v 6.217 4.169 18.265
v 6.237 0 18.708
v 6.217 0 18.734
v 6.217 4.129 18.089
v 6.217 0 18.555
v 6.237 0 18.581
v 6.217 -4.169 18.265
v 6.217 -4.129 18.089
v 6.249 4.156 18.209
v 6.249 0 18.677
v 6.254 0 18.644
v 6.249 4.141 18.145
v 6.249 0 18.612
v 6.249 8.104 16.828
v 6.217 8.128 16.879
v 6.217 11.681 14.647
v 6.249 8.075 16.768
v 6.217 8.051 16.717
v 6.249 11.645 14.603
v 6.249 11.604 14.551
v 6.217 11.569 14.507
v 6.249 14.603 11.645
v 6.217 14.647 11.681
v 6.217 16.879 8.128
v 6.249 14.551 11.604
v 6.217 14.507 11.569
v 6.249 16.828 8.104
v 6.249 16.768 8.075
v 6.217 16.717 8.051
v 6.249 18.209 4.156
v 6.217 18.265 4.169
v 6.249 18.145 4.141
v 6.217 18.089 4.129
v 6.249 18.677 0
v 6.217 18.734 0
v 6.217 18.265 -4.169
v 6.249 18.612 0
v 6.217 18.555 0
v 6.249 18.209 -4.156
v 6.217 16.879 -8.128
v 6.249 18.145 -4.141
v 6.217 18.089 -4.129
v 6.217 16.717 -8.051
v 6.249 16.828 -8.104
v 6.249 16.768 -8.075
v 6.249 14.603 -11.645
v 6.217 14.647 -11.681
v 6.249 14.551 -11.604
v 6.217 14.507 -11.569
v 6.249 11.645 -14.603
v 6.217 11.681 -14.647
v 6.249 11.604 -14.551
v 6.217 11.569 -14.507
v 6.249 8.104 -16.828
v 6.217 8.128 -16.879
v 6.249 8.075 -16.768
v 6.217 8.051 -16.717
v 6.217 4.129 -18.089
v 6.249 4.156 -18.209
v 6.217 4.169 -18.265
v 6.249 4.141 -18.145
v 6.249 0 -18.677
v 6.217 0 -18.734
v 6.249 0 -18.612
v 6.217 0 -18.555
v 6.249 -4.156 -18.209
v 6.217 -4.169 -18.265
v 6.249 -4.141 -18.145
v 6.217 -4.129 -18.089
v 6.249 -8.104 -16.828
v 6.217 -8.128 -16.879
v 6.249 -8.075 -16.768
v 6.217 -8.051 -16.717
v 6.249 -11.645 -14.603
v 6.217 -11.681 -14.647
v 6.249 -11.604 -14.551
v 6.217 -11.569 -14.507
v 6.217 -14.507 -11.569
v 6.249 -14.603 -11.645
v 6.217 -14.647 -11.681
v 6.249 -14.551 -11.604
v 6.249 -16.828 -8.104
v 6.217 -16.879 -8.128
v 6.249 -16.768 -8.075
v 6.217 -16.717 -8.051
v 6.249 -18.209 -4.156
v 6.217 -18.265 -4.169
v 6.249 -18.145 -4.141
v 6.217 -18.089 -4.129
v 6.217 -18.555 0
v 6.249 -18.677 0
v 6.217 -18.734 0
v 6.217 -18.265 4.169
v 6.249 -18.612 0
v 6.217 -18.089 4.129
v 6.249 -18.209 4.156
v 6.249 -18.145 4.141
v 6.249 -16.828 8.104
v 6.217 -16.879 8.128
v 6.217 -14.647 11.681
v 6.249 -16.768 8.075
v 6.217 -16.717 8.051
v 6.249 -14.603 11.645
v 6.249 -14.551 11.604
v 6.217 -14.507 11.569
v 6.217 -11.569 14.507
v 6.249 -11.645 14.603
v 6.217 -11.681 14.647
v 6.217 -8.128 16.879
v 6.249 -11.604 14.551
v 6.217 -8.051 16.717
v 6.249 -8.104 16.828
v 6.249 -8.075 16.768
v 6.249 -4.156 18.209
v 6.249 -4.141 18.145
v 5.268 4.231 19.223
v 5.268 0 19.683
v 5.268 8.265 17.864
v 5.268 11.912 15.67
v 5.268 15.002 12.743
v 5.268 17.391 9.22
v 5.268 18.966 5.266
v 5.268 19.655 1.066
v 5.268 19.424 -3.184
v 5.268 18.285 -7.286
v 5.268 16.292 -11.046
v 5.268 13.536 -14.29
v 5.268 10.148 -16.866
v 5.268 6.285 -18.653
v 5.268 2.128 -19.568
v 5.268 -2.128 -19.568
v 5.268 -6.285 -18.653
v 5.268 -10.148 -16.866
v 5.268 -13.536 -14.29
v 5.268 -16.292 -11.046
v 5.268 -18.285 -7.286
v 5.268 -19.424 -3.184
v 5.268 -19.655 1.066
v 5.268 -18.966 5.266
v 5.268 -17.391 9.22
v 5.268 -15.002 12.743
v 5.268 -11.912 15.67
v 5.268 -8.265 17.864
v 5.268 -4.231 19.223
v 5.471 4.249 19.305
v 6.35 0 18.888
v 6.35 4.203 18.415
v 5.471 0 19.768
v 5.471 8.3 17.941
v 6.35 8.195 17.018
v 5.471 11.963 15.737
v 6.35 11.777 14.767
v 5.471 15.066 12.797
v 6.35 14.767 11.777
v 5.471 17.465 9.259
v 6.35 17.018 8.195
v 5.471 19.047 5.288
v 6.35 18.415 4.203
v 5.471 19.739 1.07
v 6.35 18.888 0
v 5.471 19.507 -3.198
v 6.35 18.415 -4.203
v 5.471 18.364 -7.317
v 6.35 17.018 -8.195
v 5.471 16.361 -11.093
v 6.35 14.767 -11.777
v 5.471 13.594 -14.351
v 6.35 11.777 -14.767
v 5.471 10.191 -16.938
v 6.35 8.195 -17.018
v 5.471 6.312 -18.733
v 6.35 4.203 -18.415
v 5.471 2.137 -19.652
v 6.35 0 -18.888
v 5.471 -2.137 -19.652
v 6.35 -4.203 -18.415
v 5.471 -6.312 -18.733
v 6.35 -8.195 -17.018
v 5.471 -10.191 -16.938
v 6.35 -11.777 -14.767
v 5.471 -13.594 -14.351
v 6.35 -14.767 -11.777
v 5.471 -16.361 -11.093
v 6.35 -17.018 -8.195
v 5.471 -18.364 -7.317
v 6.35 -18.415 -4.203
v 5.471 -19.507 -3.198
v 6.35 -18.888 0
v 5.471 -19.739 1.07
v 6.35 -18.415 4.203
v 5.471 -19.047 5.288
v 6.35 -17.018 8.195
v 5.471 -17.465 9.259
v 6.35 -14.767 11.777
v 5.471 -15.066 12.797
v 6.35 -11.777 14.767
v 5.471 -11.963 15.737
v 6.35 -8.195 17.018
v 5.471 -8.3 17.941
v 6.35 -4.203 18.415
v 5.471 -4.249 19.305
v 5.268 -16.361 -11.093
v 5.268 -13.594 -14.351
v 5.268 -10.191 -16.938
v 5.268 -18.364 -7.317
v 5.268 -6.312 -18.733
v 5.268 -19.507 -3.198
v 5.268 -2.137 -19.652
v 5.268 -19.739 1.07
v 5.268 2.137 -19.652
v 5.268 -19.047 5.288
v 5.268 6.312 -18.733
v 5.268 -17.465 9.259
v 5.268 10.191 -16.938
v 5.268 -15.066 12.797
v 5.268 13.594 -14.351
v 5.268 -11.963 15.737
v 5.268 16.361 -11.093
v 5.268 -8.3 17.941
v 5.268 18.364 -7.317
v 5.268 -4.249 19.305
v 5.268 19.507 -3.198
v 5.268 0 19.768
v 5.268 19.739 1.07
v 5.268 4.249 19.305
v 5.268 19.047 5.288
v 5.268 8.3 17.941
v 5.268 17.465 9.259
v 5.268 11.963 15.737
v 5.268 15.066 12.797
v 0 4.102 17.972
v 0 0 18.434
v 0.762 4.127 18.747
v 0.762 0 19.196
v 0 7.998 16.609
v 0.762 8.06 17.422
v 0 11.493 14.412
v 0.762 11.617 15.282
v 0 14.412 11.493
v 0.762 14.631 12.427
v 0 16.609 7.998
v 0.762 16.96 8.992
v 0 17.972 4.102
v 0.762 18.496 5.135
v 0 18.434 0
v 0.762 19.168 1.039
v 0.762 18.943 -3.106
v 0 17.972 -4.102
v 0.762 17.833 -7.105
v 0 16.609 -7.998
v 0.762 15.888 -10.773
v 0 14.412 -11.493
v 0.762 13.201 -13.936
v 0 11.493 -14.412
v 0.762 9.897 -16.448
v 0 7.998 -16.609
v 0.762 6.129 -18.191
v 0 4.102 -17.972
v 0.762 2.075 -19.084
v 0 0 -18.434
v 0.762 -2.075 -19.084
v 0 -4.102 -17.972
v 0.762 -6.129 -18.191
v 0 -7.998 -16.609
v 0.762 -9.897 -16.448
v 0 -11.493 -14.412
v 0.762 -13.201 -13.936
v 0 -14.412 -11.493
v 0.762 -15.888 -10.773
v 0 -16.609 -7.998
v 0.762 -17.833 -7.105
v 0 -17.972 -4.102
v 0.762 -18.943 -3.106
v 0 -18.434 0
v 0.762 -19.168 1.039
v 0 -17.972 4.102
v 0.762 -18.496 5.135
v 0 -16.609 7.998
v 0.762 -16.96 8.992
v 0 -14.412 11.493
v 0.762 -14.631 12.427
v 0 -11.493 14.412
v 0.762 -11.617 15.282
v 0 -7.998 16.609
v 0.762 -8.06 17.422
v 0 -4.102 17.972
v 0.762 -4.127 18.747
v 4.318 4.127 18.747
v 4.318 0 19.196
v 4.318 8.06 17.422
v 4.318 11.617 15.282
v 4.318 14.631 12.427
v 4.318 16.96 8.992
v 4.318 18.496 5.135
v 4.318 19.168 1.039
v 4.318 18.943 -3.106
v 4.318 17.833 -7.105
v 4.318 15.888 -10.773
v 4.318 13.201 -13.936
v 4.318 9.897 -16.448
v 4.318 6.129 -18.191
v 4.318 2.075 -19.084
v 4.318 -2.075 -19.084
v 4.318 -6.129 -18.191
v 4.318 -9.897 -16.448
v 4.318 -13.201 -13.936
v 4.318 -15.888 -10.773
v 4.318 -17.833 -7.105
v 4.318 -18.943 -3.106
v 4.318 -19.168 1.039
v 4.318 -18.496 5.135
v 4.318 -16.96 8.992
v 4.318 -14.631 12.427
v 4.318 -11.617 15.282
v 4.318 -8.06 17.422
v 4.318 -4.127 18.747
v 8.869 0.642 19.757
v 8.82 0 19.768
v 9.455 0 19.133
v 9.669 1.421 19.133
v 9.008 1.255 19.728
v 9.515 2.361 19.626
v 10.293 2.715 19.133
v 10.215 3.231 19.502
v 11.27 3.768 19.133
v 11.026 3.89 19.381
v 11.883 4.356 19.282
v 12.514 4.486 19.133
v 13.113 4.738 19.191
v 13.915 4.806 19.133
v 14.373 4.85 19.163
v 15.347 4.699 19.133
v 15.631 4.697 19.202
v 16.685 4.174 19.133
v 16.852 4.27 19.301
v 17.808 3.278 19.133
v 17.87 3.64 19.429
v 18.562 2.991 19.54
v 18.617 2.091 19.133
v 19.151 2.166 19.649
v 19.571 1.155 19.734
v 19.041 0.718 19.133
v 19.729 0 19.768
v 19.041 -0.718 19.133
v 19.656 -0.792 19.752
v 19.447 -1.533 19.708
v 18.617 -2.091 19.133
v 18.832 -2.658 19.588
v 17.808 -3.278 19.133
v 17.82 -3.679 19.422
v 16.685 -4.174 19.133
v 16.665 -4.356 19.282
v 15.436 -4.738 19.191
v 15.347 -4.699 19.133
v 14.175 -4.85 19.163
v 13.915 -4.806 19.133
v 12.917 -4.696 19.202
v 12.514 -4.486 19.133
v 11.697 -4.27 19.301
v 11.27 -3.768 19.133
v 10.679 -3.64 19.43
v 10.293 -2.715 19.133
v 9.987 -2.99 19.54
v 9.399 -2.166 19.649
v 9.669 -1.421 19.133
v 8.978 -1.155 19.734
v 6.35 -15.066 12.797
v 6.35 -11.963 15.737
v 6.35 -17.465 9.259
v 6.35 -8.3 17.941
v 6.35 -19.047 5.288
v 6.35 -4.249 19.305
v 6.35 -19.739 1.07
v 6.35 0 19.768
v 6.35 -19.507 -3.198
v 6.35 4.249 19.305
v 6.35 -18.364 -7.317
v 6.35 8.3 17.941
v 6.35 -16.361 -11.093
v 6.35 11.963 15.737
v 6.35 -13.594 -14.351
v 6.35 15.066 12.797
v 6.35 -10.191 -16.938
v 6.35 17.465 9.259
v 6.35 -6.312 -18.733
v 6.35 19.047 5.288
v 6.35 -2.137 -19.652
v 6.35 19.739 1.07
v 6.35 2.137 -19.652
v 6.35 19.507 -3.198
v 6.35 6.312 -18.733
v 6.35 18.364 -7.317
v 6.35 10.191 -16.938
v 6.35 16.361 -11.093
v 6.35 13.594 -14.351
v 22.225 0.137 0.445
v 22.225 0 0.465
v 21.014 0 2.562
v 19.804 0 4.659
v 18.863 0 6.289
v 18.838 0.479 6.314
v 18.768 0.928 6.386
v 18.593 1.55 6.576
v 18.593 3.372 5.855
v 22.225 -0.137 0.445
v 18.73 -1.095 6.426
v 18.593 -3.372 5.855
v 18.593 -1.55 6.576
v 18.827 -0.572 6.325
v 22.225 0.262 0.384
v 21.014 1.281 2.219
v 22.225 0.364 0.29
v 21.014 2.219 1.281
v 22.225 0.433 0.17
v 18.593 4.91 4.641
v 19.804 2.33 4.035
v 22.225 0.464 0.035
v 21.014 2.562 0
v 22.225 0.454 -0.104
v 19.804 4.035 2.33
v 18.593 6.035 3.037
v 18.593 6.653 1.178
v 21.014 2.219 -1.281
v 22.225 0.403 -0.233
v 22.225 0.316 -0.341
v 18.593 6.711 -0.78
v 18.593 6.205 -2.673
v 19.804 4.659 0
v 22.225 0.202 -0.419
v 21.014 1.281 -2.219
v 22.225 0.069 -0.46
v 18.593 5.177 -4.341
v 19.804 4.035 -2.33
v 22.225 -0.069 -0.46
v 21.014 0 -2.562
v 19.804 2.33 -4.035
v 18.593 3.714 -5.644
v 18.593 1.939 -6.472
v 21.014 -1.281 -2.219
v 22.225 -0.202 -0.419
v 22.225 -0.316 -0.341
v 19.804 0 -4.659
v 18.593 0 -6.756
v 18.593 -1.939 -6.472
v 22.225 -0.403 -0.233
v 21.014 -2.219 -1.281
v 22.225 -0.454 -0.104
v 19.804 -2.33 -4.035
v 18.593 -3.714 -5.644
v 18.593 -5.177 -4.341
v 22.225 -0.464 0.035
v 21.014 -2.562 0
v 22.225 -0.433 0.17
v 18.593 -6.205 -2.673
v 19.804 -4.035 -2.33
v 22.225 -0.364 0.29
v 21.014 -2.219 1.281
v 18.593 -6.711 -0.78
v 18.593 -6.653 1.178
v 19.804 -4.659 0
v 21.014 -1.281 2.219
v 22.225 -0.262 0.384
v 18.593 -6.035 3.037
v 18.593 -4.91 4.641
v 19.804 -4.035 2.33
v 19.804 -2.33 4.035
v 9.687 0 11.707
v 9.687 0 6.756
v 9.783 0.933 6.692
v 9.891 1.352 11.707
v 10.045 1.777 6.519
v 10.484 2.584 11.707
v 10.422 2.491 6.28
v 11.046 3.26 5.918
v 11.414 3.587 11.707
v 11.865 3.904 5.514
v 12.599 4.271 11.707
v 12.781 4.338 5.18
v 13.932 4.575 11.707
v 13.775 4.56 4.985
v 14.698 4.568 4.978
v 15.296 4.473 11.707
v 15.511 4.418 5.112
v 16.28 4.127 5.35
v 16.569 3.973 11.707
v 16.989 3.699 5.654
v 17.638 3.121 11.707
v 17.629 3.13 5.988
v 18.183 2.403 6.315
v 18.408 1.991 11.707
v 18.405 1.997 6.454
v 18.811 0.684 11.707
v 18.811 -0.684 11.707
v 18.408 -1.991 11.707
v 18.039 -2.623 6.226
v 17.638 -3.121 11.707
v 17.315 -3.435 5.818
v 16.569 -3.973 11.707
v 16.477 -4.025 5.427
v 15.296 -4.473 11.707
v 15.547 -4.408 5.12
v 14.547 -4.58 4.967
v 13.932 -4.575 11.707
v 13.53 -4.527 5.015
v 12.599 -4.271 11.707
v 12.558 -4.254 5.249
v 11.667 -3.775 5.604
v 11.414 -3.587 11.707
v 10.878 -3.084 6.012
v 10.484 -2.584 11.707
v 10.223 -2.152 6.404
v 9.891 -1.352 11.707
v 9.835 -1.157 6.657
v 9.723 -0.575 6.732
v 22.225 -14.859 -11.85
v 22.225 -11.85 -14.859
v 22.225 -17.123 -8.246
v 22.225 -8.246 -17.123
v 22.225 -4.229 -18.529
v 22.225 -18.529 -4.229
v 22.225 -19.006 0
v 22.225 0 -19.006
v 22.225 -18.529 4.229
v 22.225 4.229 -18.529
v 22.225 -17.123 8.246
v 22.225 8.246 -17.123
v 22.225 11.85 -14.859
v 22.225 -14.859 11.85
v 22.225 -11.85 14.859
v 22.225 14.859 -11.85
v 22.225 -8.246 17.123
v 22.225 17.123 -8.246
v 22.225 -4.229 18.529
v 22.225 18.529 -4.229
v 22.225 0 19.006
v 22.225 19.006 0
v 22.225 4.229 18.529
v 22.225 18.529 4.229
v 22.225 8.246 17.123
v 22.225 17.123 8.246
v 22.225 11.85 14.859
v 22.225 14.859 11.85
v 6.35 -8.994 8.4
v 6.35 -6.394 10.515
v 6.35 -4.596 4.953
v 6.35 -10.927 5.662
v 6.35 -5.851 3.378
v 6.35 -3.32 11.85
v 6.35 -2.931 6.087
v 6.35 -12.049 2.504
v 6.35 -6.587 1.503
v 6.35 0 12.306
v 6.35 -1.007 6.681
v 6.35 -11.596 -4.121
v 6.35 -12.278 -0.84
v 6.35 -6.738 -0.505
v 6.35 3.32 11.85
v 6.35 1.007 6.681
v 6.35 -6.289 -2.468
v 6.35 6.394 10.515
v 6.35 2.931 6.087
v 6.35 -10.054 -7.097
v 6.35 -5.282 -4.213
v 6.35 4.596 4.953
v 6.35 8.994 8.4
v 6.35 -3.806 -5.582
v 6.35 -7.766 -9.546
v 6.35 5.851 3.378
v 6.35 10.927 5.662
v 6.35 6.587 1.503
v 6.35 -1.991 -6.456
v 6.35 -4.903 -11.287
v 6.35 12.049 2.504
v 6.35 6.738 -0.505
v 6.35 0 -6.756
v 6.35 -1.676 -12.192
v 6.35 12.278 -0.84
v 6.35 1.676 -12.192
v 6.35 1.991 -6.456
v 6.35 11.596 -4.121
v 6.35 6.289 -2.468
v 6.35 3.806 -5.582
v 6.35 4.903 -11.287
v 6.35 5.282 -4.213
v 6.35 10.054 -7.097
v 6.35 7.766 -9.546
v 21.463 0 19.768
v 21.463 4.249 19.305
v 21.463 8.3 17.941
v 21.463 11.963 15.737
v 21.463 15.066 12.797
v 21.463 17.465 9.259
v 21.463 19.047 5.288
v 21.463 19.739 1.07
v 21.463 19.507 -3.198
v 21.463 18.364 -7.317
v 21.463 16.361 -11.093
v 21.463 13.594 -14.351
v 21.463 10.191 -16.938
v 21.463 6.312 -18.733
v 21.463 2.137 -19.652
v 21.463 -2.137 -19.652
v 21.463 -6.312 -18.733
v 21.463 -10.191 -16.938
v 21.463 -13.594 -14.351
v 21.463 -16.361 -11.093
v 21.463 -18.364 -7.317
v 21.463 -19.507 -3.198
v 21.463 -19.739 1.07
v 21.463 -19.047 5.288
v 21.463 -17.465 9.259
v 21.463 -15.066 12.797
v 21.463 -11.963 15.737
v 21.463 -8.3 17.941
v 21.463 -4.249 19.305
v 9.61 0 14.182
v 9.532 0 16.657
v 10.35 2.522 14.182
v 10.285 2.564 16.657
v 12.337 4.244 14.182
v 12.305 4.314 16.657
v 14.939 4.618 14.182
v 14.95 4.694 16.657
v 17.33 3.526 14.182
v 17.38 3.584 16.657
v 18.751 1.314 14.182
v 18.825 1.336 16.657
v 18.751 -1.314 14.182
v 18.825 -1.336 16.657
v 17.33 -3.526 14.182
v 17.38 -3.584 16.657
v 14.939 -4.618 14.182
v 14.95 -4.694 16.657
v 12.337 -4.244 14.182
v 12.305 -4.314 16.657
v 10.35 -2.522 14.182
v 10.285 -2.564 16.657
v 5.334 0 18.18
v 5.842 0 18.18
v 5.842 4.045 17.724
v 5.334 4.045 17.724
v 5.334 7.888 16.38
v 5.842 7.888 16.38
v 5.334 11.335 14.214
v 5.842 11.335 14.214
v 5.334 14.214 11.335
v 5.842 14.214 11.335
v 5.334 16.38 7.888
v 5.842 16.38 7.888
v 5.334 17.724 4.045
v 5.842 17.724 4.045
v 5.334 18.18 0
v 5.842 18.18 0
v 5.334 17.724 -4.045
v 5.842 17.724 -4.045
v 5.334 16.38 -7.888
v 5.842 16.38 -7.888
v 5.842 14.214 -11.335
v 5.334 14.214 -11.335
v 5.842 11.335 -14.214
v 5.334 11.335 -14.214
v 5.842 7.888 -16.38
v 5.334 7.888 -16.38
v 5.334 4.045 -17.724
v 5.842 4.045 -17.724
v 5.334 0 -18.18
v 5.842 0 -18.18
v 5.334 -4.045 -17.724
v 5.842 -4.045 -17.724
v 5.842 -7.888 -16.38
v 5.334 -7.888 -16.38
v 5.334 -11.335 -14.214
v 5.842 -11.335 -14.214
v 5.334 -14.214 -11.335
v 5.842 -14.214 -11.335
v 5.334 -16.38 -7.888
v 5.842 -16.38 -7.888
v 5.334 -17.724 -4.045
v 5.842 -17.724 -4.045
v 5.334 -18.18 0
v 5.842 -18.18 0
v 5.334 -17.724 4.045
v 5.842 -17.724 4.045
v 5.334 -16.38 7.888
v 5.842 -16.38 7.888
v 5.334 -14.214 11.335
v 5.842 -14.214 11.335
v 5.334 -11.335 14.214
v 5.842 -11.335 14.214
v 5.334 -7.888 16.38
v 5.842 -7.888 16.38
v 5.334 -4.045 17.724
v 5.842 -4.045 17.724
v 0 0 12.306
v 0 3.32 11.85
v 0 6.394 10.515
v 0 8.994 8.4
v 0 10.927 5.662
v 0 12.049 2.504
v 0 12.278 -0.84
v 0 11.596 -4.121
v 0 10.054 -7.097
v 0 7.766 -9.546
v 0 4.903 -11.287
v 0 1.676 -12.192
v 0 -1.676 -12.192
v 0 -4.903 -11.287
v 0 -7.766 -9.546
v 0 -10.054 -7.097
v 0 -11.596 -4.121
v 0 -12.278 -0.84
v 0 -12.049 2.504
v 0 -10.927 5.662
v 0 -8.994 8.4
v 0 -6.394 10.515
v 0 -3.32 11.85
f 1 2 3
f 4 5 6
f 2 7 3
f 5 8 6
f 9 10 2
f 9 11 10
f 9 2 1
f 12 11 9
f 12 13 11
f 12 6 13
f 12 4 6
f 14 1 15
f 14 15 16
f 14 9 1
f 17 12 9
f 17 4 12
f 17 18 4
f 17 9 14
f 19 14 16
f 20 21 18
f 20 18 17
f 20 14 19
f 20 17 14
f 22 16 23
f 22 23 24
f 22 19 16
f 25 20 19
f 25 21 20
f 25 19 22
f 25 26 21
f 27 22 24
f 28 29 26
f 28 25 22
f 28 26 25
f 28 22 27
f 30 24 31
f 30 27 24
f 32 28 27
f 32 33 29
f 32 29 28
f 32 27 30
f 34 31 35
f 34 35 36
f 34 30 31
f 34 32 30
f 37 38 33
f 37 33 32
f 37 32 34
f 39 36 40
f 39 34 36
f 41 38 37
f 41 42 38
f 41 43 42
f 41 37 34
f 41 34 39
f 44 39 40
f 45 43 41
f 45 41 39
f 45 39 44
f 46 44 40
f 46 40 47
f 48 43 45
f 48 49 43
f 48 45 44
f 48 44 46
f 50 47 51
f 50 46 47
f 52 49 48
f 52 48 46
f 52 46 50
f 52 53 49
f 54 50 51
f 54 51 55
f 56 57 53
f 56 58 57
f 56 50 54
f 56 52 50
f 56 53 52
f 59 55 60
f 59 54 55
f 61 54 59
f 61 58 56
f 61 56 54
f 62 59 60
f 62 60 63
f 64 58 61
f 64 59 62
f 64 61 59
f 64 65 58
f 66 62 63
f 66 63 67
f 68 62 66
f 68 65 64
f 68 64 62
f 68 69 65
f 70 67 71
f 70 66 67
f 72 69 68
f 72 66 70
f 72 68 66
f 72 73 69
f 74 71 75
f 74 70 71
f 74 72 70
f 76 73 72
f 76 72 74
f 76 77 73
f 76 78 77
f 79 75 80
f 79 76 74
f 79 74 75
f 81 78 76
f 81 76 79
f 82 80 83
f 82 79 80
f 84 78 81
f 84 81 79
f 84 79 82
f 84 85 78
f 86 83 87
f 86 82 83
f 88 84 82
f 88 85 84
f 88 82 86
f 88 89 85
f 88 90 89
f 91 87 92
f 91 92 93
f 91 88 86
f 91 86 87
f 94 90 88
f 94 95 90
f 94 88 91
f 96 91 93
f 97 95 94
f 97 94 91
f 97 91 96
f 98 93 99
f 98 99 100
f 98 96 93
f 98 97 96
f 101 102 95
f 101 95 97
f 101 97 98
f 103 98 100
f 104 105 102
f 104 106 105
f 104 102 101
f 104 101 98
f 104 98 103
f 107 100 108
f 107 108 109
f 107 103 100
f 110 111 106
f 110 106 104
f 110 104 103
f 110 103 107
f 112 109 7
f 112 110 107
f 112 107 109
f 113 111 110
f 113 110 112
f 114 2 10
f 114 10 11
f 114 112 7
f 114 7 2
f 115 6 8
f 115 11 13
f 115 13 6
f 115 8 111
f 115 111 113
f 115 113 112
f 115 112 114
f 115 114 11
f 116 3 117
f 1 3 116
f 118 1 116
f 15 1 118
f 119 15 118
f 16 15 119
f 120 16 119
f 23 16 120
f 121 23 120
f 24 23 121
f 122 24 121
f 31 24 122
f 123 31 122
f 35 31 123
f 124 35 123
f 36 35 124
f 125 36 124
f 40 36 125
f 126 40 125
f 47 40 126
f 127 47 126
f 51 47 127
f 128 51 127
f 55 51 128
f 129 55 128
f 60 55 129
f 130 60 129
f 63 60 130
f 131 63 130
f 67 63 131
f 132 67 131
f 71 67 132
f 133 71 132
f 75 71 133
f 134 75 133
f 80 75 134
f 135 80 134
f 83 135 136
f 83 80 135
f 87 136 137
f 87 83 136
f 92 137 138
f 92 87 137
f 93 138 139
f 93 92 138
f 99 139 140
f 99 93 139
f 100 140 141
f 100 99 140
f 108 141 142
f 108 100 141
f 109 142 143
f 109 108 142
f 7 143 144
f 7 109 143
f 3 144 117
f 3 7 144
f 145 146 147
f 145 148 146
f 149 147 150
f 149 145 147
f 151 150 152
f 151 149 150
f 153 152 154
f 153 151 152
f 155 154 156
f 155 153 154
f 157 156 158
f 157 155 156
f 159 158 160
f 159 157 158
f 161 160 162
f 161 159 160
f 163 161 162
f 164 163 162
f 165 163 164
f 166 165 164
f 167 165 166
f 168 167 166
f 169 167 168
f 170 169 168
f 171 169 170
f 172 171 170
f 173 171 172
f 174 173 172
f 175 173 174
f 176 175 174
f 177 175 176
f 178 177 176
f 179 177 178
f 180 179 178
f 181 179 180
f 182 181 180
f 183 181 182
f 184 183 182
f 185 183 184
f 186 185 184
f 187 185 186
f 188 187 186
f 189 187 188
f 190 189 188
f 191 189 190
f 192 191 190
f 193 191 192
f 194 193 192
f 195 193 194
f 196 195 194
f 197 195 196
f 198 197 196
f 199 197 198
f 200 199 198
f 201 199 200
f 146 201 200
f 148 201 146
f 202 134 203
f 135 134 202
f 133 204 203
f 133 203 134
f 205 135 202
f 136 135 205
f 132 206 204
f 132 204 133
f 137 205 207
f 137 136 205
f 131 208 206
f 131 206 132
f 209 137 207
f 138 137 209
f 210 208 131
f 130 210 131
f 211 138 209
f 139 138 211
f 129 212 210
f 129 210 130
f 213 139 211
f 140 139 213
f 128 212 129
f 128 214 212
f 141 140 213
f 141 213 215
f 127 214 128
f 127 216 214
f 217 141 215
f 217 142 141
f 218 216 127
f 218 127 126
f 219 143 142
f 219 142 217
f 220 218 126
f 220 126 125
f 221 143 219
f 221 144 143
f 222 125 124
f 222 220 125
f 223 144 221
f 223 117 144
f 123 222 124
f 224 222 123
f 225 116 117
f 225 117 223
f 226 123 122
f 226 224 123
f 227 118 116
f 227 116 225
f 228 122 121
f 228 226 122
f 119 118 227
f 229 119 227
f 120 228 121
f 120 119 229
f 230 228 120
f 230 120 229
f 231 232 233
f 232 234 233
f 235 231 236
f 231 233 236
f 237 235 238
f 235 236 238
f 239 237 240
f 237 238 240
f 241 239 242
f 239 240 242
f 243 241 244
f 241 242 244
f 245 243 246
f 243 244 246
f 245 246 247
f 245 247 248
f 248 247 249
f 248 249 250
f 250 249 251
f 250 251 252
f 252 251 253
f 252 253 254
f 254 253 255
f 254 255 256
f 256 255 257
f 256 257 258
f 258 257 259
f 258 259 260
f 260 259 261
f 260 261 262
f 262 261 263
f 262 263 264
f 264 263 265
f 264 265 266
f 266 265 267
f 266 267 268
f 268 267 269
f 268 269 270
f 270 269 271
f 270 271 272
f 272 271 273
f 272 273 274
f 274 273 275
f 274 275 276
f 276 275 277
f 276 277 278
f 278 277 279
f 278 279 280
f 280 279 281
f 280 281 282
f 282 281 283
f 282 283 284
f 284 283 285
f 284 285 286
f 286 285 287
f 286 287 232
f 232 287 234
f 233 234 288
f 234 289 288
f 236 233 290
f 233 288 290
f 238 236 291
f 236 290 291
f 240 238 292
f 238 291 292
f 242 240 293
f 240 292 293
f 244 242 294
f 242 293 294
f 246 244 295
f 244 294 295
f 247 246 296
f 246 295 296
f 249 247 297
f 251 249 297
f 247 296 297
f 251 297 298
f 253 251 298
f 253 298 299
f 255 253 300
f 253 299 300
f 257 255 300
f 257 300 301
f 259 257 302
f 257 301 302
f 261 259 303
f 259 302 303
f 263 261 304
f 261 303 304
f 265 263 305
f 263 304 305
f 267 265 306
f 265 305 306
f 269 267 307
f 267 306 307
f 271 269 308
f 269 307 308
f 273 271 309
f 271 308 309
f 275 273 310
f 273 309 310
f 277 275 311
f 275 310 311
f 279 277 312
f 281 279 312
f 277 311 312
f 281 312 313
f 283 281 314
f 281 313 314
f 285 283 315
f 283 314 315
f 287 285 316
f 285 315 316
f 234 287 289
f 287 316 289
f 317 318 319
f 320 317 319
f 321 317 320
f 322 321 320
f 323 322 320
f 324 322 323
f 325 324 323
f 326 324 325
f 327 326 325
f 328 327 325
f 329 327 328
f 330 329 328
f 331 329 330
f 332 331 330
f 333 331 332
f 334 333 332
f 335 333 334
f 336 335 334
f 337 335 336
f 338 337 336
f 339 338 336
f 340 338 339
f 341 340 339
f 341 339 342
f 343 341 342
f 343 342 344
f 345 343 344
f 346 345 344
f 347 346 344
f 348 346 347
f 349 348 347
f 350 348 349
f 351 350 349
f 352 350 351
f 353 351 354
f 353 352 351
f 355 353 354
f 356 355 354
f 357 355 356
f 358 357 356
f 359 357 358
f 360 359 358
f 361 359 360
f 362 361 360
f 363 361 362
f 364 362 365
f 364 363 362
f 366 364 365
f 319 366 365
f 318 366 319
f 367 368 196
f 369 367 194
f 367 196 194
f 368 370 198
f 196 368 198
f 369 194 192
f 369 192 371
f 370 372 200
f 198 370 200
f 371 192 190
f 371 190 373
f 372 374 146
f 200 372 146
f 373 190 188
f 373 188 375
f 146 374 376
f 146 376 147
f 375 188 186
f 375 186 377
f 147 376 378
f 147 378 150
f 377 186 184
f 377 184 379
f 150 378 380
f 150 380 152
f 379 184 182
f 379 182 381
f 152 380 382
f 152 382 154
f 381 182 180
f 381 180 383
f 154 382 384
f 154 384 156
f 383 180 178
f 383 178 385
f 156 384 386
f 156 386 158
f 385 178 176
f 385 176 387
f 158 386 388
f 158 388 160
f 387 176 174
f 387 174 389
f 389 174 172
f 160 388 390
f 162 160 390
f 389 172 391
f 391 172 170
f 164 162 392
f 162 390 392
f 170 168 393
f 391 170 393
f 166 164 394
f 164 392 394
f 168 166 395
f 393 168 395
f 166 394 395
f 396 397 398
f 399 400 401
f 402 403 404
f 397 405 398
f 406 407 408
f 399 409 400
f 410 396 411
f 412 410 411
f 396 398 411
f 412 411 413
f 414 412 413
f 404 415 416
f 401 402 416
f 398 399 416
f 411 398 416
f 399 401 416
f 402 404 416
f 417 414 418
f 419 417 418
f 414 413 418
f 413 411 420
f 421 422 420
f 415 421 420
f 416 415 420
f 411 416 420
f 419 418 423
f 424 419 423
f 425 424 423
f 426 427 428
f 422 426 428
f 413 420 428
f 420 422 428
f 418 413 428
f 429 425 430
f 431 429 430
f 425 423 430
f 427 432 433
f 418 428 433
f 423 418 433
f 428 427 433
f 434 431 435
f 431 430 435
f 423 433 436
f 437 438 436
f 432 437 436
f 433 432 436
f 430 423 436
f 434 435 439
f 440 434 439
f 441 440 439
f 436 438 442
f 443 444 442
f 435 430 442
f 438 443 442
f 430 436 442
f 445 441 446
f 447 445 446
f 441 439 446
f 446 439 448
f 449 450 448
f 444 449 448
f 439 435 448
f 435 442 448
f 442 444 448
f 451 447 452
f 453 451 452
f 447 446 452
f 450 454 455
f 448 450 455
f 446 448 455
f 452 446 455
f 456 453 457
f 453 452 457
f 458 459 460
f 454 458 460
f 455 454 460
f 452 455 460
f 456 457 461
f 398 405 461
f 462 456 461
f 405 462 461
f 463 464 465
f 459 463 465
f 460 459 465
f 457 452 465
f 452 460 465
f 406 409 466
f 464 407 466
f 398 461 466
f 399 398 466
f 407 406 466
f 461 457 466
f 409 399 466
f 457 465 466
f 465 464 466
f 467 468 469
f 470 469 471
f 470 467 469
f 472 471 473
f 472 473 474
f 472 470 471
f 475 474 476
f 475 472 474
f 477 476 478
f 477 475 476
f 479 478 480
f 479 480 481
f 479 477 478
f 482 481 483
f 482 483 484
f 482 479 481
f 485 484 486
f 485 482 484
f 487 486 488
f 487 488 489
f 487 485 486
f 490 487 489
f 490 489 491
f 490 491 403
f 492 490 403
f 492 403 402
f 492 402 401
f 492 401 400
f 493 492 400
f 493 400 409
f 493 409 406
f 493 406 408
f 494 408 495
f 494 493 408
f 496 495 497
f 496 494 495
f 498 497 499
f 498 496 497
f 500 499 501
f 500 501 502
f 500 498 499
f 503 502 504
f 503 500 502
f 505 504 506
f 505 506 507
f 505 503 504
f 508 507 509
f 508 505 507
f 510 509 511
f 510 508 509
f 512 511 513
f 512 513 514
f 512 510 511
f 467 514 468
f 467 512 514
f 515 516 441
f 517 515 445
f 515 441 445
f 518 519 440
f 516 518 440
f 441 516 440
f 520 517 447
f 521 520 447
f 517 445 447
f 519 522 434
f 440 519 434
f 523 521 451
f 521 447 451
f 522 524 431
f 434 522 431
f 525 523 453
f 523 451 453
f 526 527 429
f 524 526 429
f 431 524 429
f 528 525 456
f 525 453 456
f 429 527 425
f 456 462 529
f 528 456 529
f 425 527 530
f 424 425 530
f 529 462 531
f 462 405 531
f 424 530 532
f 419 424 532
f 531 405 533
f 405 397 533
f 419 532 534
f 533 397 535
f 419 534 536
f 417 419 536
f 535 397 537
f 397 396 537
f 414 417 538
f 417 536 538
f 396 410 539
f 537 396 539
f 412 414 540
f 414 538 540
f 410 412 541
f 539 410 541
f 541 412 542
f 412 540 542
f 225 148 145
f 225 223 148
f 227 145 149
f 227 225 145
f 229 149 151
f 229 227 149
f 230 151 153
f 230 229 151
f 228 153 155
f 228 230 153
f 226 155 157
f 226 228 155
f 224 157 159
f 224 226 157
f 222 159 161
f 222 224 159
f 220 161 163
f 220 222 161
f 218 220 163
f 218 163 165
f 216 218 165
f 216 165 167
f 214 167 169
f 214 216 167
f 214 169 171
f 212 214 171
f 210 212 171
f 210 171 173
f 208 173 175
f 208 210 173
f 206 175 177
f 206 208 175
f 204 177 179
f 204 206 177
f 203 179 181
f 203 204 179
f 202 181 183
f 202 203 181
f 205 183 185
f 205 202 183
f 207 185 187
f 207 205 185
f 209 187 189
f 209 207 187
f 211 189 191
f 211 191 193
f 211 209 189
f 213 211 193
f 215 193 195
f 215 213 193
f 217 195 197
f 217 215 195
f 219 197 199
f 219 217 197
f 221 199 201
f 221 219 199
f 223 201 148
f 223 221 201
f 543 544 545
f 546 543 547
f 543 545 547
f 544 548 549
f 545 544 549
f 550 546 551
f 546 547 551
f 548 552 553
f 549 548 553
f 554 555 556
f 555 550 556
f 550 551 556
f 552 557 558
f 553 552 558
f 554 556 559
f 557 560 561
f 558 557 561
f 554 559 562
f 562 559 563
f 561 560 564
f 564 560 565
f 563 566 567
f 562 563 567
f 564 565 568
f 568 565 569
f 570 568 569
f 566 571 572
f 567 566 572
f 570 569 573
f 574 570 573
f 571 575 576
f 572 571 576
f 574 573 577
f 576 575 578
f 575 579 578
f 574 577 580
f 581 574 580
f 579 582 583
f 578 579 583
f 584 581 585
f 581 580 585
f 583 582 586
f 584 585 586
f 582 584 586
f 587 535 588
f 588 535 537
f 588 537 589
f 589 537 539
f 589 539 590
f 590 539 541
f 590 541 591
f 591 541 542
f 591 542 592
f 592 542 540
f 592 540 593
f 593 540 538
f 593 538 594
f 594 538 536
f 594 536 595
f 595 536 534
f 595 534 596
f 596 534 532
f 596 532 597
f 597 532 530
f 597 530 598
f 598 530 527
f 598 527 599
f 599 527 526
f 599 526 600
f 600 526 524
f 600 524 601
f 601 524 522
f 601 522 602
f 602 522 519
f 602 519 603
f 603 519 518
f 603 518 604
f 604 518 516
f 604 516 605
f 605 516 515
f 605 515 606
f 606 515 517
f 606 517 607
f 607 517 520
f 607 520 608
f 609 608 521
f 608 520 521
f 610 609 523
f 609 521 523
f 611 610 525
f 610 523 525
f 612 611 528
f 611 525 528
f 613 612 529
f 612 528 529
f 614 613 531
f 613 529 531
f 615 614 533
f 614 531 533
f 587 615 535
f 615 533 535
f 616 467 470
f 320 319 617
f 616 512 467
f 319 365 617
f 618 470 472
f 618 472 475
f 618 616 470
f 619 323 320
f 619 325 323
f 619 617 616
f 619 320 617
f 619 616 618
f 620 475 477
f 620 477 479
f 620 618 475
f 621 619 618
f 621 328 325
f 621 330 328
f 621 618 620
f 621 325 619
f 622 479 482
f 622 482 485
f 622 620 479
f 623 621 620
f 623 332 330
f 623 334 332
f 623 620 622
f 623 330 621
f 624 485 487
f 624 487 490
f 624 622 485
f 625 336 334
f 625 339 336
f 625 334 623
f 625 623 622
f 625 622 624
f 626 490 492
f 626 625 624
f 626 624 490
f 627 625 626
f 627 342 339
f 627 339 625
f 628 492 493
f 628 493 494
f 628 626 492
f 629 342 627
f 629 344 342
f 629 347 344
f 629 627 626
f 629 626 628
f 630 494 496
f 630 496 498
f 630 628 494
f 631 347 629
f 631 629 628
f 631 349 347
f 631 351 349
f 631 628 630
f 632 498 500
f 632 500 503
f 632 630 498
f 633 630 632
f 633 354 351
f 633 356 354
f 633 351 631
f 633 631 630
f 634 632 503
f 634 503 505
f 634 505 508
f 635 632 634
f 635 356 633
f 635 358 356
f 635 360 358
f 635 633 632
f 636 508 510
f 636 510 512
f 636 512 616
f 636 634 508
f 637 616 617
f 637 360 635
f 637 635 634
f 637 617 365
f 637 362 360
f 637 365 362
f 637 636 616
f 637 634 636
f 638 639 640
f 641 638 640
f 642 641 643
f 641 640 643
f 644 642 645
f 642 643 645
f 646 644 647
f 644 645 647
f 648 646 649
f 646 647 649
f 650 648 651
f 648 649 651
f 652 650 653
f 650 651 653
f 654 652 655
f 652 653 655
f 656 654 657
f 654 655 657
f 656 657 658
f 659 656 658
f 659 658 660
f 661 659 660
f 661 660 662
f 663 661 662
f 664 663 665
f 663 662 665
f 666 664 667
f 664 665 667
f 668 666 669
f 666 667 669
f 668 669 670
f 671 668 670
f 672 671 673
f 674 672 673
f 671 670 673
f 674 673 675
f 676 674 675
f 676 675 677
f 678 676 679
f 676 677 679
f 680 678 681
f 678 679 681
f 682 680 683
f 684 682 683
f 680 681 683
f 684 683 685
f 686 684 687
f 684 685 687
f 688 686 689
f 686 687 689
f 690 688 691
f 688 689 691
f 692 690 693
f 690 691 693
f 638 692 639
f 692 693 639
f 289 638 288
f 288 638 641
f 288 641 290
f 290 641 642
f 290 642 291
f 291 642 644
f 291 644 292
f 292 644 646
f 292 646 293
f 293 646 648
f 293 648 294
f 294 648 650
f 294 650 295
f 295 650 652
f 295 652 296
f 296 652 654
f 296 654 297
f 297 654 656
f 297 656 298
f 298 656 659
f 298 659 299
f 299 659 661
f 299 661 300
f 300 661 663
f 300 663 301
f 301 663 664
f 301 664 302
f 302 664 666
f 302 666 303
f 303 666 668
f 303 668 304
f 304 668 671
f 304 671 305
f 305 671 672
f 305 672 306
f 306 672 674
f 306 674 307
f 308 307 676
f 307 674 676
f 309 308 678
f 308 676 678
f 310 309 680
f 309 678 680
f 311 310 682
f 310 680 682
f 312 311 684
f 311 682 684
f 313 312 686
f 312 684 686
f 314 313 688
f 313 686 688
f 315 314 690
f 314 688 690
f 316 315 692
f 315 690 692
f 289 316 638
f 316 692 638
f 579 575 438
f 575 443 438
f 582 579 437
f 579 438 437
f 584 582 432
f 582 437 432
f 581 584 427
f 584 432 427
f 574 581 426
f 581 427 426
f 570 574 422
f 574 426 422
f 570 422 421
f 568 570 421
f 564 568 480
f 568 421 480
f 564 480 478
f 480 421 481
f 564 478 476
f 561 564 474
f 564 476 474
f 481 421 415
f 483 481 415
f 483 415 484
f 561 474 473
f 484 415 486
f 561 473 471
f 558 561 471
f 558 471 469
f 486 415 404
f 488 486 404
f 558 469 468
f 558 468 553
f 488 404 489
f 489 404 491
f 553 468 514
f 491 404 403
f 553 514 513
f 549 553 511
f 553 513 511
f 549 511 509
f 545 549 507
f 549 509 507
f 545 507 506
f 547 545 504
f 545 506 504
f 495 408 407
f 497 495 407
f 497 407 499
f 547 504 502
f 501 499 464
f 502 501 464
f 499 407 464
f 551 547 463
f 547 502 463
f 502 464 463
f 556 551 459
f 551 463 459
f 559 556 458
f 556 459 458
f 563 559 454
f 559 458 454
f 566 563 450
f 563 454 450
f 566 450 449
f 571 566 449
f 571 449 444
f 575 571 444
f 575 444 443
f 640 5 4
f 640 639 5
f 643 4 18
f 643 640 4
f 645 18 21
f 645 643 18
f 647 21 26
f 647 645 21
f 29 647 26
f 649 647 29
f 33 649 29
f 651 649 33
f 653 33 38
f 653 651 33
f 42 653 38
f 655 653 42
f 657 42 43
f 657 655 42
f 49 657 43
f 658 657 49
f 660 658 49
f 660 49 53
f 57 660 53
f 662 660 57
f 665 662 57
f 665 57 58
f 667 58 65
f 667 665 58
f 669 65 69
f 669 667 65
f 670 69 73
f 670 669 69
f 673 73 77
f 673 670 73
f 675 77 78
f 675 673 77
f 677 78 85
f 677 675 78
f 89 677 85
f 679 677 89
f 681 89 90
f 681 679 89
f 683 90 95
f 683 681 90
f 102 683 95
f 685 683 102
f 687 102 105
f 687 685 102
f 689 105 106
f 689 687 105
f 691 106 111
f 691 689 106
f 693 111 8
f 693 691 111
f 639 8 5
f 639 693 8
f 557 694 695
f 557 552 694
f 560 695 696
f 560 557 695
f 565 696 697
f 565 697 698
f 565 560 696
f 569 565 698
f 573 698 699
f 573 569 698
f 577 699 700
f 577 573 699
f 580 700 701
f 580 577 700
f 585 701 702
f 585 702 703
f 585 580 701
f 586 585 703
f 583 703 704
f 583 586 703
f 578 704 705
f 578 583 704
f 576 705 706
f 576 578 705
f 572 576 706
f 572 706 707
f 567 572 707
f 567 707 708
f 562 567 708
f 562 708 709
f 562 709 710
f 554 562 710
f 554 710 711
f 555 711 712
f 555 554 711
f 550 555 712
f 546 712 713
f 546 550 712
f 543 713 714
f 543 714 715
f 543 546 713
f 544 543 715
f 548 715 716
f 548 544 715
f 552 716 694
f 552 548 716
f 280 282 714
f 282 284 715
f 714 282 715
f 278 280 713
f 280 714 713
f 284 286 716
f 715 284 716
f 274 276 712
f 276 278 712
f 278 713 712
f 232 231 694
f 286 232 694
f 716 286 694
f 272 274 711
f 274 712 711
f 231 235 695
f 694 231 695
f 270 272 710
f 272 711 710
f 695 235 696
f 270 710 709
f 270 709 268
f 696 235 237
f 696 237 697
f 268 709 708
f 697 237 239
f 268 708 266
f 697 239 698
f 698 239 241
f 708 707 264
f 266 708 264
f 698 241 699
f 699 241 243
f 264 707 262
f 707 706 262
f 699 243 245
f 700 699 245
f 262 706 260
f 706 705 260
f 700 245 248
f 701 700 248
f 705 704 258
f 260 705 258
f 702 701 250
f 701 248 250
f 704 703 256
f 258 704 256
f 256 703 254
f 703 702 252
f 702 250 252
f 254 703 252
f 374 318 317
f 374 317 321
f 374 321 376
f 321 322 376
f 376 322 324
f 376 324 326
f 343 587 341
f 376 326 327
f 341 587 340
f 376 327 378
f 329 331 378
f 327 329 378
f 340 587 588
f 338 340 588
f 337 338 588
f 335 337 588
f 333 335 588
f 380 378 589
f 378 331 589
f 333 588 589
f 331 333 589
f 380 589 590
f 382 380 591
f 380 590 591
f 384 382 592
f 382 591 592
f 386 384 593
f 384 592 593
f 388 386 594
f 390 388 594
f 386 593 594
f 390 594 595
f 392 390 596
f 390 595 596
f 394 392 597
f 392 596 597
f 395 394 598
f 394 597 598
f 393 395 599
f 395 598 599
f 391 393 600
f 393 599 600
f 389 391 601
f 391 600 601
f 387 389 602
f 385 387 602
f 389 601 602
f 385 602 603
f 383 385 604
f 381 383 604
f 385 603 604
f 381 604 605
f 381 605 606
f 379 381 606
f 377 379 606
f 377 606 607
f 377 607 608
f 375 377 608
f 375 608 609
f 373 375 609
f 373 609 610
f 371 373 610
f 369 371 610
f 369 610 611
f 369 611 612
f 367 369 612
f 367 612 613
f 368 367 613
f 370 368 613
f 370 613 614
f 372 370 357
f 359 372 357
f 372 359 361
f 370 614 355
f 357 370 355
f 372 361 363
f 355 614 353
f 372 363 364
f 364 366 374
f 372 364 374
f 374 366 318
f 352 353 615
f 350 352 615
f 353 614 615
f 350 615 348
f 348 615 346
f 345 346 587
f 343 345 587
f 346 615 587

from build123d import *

# Parameters (mm, degrees)
HOLE1_D     = 13.5128
HOLE1_DEPTH = 18.5928
HOLE1_TIP   = 3.900809359
SKETCH5_W   = 6.35
SKETCH5_H   = 12.3063


with BuildPart() as part:
    # Sketch1 → Revolve1 (revolve)
    with BuildSketch(Plane.XY):
        Polygon((0, 0), (0, 18.43405), (0.762, 19.19605), (4.318, 19.19605), (5.334, 18.18005), (6.35, 18.18005), (6.35, 19.76755), (21.463, 19.76755), (22.225, 19.00555), (22.225, 0), align=None)
    revolve(axis=Axis((22.225, 0, 0), (-1, 0, 0)))

    # Hole1
    with Locations(Plane.ZY):
        with Locations((0, 0)):
            Hole(HOLE1_D / 2, depth=HOLE1_DEPTH)
            with Locations((0, 0, -(HOLE1_DEPTH + HOLE1_TIP / 2))):  # 120° drill point
                Cone(0, HOLE1_D / 2, HOLE1_TIP, mode=Mode.SUBTRACT)

    # Sketch4 → Cut-Revolve1 (revolve, cut)
    with BuildSketch(Plane(origin=(0, 0, 0), x_dir=(1, 0, 0), z_dir=(0, 1, 0))):
        Polygon((14.2748, 0), (18.86262618, 0), (18.86262618, -11.706901754), (19.094451116, -19.132537191), (19.729463925, -19.76755), (14.2748, -19.76755), align=None)
    revolve(axis=Axis((14.2748, 0, 19.76755), (0, 0, -1)), mode=Mode.SUBTRACT)

    # Sketch5 → Cut-Revolve2 (revolve, cut)
    with BuildSketch(Plane.XY):
        with Locations((3.175, 6.15315)):
            Rectangle(SKETCH5_W, SKETCH5_H)
    revolve(axis=Axis((6.35, 0, 0), (-1, 0, 0)), mode=Mode.SUBTRACT)

    # Sketch6 → Revolve2 (revolve)
    with BuildSketch(Plane.XY):
        with BuildLine():
            Line((5.267509175, 19.683381804), (6.216617928, 18.734273051))
            ThreePointArc((6.216617928, 18.734273051), (6.253815367, 18.64447049), (6.216617928, 18.554667928))
            Line((6.216617928, 18.554667928), (5.842, 18.18005))
            Line((5.842, 18.18005), (5.334, 18.18005))
            Line((5.334, 18.18005), (5.334, 17.92605))
            Line((5.334, 17.92605), (6.35, 17.92605))
            Line((6.35, 17.92605), (6.35, 18.888259175))
            Line((6.35, 18.888259175), (5.470709175, 19.76755))
            Line((5.470709175, 19.76755), (5.267509175, 19.76755))
            Line((5.267509175, 19.76755), (5.267509175, 19.683381804))
        make_face()
    revolve(axis=Axis((6.35, 0, 0), (-1, 0, 0)))


solid = part.part
